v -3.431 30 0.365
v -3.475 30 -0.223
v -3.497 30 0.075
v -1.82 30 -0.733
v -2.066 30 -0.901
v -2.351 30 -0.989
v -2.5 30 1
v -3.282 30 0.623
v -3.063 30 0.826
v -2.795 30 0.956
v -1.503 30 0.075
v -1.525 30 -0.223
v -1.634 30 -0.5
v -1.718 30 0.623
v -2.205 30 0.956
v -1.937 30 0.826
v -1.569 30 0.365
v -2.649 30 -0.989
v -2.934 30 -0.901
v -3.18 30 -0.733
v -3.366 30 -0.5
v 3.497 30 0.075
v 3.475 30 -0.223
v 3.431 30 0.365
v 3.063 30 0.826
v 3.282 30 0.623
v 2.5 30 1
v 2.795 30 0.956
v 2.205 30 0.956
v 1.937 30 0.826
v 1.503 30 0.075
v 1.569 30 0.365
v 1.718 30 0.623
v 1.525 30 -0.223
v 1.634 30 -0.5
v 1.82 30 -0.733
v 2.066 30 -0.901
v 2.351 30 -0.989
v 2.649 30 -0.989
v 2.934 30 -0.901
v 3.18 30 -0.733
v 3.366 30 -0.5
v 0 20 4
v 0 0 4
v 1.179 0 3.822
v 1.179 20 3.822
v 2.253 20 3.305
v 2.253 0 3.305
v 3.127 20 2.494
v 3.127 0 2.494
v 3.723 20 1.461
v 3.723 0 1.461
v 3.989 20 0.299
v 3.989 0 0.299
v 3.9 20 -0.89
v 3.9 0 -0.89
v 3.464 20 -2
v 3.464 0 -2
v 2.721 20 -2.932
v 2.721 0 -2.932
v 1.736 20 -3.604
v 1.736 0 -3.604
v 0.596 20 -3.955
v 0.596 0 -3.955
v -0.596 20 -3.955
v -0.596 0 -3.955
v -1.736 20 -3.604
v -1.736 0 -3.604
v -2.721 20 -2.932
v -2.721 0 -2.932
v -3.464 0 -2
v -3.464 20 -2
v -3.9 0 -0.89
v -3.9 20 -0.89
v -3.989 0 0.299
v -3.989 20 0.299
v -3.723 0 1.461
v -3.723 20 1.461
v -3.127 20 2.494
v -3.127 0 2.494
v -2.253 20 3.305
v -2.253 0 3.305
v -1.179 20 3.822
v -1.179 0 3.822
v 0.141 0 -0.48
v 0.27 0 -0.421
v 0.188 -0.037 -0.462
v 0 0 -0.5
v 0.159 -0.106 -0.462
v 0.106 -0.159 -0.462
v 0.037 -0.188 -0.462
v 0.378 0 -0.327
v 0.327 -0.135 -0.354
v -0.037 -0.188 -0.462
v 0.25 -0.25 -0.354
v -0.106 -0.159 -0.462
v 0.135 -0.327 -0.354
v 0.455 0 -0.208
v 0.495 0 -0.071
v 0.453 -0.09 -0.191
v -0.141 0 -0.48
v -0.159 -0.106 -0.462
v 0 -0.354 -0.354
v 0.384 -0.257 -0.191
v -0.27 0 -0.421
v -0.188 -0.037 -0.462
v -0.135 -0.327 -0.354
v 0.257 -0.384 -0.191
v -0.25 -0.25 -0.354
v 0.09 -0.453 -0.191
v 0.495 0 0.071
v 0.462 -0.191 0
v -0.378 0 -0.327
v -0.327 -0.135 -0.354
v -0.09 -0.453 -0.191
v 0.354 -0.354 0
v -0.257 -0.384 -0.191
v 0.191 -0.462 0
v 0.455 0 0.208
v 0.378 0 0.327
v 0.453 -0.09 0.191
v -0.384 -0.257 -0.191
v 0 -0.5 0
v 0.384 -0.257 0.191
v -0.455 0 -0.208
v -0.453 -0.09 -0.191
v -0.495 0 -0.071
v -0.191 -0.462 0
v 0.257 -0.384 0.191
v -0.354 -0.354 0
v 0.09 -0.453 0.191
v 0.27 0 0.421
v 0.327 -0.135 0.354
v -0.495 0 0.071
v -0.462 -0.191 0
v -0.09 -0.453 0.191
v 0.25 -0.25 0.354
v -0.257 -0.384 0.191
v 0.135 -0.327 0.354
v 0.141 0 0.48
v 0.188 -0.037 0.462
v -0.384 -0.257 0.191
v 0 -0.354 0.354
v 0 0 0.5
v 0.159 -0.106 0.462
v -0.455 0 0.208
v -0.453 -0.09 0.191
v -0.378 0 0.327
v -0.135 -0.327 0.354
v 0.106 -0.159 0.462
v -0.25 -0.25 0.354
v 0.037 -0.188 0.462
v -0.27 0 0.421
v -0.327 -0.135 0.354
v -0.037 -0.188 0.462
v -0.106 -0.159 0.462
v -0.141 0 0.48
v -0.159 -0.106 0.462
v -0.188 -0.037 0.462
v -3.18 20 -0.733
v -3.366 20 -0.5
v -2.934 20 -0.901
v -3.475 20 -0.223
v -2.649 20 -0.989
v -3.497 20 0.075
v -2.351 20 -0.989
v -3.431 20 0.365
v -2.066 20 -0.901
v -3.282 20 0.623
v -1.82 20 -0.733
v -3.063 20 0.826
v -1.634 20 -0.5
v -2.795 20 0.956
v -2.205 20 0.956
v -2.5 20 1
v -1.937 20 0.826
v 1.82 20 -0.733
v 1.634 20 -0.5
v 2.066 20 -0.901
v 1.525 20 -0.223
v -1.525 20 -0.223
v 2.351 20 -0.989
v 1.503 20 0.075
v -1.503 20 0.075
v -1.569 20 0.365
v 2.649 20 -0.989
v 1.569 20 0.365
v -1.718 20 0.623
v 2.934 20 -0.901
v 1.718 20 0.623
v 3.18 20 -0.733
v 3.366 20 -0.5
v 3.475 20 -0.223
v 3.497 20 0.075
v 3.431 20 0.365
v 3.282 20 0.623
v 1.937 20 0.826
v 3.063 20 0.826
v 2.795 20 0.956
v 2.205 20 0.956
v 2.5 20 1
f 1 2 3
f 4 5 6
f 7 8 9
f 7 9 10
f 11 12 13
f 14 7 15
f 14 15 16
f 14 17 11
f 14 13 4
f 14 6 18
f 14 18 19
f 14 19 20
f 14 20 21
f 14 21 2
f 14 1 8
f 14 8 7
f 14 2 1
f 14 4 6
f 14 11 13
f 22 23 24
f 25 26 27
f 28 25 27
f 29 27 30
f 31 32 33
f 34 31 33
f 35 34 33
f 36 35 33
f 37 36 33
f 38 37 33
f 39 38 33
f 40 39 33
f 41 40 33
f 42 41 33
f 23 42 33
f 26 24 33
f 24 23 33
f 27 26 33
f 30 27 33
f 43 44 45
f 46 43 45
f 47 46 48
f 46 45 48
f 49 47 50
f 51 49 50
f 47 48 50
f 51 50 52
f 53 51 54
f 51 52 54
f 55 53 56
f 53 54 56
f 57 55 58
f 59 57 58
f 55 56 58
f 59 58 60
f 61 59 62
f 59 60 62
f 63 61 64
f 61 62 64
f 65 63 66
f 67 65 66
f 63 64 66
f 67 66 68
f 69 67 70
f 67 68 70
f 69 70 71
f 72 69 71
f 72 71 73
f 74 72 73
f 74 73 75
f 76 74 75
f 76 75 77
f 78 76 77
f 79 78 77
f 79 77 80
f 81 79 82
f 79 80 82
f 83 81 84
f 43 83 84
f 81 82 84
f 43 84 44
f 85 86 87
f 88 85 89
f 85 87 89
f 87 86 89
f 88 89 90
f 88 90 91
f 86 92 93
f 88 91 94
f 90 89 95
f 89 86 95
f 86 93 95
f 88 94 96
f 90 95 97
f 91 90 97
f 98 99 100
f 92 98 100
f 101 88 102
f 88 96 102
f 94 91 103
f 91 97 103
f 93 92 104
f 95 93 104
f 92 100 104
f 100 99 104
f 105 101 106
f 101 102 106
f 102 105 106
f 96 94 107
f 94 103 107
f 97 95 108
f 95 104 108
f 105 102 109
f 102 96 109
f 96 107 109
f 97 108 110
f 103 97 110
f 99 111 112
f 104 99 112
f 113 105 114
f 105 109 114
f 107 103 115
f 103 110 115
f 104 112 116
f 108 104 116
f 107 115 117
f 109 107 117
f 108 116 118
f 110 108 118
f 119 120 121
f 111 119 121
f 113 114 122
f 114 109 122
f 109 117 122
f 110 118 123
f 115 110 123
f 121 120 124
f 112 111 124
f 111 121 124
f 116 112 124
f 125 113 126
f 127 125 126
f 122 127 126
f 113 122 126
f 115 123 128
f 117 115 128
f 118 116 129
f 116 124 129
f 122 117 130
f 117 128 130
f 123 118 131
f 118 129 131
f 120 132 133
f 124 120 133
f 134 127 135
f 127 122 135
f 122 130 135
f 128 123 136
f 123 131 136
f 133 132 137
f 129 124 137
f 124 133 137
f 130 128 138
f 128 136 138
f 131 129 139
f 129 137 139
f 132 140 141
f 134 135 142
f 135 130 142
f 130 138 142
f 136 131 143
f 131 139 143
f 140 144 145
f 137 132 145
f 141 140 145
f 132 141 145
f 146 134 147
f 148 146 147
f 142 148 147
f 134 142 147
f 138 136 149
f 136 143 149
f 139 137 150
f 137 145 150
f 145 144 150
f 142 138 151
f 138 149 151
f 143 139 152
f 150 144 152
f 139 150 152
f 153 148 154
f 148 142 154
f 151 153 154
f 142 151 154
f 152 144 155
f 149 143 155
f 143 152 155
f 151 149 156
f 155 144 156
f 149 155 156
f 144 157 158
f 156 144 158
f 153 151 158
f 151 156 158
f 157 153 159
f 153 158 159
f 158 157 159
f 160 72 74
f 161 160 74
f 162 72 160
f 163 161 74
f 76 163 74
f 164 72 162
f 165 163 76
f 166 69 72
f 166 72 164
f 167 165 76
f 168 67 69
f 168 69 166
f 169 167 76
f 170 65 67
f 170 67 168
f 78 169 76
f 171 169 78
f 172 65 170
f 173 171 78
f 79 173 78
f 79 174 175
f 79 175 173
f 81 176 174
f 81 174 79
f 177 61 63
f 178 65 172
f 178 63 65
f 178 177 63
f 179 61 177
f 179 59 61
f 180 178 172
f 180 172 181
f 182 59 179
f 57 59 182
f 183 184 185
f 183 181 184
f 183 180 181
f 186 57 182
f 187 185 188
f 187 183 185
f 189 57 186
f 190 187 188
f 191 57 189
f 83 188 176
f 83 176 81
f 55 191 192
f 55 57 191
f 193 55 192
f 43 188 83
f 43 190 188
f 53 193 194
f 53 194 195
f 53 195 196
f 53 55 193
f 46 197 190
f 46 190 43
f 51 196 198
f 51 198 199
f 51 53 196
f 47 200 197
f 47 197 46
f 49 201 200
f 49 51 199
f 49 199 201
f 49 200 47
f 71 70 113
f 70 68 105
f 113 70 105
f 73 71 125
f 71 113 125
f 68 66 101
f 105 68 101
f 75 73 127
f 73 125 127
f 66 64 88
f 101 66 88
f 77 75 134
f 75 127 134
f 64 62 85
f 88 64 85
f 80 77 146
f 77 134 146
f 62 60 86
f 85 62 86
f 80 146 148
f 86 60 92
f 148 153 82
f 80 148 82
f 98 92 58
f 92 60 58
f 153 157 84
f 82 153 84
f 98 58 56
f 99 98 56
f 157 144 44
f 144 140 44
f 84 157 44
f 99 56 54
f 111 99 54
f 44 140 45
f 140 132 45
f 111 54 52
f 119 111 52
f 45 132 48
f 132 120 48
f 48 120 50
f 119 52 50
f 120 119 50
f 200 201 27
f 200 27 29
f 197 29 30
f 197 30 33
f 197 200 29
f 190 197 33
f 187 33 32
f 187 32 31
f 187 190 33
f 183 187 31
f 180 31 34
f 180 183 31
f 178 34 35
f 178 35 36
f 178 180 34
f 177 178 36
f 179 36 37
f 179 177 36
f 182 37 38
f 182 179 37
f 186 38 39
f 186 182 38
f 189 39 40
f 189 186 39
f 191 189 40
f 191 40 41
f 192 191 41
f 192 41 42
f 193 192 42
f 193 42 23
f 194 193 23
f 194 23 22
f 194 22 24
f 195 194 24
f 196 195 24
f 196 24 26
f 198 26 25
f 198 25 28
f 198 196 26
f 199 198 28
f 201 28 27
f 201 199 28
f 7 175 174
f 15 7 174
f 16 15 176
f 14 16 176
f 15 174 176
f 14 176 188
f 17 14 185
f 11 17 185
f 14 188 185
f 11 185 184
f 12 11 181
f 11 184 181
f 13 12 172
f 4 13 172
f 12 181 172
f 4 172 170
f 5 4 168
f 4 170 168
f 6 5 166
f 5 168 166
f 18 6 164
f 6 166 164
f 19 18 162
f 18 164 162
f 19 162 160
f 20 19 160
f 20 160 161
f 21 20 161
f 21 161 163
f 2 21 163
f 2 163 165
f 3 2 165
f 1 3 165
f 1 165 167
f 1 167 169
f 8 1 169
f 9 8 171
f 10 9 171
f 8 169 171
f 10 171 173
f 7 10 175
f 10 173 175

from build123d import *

# Parameters (mm, degrees)
SKETCH_1_R      = 4
EXTRUDE_1_DEPTH = 20
SKETCH_2_R      = 1
EXTRUDE_2_DEPTH = 10


with BuildPart() as part:
    # 草图1 → 凸台-拉伸1 (new body)
    with BuildSketch(Plane(origin=(0, 0, 0), x_dir=(1, 0, 0), z_dir=(0, 1, 0))):
        with Locations(Location((0, 0, 0), (0, 0, 270))):
            Circle(SKETCH_1_R)
    extrude(amount=EXTRUDE_1_DEPTH)

    # 草图2 → 凸台-拉伸2 (add)
    with BuildSketch(Plane(origin=(0, 20, 0), x_dir=(1, 0, 0), z_dir=(0, 1, 0))):
        with Locations(Location((-2.5, 0, 0), (0, 0, 270))):
            Circle(SKETCH_2_R)
    extrude_2 = extrude(amount=EXTRUDE_2_DEPTH)

    # 镜向1: 凸台-拉伸2 across plane
    add(extrude_2.mirror(Plane(origin=(0, 0, 0), x_dir=(0, 0, 1), z_dir=(1, 0, 0))))

    # 草图4 → 旋转1 (revolve)
    with BuildSketch(Plane.XZ):
        with BuildLine():
            Line((0, 0.5), (0, -0.5))
            ThreePointArc((0, -0.5), (-0.5, 0), (0, 0.5))
        make_face()
    revolve(axis=Axis((0, 0, 0.5), (0, 0, -1)))


solid = part.part
